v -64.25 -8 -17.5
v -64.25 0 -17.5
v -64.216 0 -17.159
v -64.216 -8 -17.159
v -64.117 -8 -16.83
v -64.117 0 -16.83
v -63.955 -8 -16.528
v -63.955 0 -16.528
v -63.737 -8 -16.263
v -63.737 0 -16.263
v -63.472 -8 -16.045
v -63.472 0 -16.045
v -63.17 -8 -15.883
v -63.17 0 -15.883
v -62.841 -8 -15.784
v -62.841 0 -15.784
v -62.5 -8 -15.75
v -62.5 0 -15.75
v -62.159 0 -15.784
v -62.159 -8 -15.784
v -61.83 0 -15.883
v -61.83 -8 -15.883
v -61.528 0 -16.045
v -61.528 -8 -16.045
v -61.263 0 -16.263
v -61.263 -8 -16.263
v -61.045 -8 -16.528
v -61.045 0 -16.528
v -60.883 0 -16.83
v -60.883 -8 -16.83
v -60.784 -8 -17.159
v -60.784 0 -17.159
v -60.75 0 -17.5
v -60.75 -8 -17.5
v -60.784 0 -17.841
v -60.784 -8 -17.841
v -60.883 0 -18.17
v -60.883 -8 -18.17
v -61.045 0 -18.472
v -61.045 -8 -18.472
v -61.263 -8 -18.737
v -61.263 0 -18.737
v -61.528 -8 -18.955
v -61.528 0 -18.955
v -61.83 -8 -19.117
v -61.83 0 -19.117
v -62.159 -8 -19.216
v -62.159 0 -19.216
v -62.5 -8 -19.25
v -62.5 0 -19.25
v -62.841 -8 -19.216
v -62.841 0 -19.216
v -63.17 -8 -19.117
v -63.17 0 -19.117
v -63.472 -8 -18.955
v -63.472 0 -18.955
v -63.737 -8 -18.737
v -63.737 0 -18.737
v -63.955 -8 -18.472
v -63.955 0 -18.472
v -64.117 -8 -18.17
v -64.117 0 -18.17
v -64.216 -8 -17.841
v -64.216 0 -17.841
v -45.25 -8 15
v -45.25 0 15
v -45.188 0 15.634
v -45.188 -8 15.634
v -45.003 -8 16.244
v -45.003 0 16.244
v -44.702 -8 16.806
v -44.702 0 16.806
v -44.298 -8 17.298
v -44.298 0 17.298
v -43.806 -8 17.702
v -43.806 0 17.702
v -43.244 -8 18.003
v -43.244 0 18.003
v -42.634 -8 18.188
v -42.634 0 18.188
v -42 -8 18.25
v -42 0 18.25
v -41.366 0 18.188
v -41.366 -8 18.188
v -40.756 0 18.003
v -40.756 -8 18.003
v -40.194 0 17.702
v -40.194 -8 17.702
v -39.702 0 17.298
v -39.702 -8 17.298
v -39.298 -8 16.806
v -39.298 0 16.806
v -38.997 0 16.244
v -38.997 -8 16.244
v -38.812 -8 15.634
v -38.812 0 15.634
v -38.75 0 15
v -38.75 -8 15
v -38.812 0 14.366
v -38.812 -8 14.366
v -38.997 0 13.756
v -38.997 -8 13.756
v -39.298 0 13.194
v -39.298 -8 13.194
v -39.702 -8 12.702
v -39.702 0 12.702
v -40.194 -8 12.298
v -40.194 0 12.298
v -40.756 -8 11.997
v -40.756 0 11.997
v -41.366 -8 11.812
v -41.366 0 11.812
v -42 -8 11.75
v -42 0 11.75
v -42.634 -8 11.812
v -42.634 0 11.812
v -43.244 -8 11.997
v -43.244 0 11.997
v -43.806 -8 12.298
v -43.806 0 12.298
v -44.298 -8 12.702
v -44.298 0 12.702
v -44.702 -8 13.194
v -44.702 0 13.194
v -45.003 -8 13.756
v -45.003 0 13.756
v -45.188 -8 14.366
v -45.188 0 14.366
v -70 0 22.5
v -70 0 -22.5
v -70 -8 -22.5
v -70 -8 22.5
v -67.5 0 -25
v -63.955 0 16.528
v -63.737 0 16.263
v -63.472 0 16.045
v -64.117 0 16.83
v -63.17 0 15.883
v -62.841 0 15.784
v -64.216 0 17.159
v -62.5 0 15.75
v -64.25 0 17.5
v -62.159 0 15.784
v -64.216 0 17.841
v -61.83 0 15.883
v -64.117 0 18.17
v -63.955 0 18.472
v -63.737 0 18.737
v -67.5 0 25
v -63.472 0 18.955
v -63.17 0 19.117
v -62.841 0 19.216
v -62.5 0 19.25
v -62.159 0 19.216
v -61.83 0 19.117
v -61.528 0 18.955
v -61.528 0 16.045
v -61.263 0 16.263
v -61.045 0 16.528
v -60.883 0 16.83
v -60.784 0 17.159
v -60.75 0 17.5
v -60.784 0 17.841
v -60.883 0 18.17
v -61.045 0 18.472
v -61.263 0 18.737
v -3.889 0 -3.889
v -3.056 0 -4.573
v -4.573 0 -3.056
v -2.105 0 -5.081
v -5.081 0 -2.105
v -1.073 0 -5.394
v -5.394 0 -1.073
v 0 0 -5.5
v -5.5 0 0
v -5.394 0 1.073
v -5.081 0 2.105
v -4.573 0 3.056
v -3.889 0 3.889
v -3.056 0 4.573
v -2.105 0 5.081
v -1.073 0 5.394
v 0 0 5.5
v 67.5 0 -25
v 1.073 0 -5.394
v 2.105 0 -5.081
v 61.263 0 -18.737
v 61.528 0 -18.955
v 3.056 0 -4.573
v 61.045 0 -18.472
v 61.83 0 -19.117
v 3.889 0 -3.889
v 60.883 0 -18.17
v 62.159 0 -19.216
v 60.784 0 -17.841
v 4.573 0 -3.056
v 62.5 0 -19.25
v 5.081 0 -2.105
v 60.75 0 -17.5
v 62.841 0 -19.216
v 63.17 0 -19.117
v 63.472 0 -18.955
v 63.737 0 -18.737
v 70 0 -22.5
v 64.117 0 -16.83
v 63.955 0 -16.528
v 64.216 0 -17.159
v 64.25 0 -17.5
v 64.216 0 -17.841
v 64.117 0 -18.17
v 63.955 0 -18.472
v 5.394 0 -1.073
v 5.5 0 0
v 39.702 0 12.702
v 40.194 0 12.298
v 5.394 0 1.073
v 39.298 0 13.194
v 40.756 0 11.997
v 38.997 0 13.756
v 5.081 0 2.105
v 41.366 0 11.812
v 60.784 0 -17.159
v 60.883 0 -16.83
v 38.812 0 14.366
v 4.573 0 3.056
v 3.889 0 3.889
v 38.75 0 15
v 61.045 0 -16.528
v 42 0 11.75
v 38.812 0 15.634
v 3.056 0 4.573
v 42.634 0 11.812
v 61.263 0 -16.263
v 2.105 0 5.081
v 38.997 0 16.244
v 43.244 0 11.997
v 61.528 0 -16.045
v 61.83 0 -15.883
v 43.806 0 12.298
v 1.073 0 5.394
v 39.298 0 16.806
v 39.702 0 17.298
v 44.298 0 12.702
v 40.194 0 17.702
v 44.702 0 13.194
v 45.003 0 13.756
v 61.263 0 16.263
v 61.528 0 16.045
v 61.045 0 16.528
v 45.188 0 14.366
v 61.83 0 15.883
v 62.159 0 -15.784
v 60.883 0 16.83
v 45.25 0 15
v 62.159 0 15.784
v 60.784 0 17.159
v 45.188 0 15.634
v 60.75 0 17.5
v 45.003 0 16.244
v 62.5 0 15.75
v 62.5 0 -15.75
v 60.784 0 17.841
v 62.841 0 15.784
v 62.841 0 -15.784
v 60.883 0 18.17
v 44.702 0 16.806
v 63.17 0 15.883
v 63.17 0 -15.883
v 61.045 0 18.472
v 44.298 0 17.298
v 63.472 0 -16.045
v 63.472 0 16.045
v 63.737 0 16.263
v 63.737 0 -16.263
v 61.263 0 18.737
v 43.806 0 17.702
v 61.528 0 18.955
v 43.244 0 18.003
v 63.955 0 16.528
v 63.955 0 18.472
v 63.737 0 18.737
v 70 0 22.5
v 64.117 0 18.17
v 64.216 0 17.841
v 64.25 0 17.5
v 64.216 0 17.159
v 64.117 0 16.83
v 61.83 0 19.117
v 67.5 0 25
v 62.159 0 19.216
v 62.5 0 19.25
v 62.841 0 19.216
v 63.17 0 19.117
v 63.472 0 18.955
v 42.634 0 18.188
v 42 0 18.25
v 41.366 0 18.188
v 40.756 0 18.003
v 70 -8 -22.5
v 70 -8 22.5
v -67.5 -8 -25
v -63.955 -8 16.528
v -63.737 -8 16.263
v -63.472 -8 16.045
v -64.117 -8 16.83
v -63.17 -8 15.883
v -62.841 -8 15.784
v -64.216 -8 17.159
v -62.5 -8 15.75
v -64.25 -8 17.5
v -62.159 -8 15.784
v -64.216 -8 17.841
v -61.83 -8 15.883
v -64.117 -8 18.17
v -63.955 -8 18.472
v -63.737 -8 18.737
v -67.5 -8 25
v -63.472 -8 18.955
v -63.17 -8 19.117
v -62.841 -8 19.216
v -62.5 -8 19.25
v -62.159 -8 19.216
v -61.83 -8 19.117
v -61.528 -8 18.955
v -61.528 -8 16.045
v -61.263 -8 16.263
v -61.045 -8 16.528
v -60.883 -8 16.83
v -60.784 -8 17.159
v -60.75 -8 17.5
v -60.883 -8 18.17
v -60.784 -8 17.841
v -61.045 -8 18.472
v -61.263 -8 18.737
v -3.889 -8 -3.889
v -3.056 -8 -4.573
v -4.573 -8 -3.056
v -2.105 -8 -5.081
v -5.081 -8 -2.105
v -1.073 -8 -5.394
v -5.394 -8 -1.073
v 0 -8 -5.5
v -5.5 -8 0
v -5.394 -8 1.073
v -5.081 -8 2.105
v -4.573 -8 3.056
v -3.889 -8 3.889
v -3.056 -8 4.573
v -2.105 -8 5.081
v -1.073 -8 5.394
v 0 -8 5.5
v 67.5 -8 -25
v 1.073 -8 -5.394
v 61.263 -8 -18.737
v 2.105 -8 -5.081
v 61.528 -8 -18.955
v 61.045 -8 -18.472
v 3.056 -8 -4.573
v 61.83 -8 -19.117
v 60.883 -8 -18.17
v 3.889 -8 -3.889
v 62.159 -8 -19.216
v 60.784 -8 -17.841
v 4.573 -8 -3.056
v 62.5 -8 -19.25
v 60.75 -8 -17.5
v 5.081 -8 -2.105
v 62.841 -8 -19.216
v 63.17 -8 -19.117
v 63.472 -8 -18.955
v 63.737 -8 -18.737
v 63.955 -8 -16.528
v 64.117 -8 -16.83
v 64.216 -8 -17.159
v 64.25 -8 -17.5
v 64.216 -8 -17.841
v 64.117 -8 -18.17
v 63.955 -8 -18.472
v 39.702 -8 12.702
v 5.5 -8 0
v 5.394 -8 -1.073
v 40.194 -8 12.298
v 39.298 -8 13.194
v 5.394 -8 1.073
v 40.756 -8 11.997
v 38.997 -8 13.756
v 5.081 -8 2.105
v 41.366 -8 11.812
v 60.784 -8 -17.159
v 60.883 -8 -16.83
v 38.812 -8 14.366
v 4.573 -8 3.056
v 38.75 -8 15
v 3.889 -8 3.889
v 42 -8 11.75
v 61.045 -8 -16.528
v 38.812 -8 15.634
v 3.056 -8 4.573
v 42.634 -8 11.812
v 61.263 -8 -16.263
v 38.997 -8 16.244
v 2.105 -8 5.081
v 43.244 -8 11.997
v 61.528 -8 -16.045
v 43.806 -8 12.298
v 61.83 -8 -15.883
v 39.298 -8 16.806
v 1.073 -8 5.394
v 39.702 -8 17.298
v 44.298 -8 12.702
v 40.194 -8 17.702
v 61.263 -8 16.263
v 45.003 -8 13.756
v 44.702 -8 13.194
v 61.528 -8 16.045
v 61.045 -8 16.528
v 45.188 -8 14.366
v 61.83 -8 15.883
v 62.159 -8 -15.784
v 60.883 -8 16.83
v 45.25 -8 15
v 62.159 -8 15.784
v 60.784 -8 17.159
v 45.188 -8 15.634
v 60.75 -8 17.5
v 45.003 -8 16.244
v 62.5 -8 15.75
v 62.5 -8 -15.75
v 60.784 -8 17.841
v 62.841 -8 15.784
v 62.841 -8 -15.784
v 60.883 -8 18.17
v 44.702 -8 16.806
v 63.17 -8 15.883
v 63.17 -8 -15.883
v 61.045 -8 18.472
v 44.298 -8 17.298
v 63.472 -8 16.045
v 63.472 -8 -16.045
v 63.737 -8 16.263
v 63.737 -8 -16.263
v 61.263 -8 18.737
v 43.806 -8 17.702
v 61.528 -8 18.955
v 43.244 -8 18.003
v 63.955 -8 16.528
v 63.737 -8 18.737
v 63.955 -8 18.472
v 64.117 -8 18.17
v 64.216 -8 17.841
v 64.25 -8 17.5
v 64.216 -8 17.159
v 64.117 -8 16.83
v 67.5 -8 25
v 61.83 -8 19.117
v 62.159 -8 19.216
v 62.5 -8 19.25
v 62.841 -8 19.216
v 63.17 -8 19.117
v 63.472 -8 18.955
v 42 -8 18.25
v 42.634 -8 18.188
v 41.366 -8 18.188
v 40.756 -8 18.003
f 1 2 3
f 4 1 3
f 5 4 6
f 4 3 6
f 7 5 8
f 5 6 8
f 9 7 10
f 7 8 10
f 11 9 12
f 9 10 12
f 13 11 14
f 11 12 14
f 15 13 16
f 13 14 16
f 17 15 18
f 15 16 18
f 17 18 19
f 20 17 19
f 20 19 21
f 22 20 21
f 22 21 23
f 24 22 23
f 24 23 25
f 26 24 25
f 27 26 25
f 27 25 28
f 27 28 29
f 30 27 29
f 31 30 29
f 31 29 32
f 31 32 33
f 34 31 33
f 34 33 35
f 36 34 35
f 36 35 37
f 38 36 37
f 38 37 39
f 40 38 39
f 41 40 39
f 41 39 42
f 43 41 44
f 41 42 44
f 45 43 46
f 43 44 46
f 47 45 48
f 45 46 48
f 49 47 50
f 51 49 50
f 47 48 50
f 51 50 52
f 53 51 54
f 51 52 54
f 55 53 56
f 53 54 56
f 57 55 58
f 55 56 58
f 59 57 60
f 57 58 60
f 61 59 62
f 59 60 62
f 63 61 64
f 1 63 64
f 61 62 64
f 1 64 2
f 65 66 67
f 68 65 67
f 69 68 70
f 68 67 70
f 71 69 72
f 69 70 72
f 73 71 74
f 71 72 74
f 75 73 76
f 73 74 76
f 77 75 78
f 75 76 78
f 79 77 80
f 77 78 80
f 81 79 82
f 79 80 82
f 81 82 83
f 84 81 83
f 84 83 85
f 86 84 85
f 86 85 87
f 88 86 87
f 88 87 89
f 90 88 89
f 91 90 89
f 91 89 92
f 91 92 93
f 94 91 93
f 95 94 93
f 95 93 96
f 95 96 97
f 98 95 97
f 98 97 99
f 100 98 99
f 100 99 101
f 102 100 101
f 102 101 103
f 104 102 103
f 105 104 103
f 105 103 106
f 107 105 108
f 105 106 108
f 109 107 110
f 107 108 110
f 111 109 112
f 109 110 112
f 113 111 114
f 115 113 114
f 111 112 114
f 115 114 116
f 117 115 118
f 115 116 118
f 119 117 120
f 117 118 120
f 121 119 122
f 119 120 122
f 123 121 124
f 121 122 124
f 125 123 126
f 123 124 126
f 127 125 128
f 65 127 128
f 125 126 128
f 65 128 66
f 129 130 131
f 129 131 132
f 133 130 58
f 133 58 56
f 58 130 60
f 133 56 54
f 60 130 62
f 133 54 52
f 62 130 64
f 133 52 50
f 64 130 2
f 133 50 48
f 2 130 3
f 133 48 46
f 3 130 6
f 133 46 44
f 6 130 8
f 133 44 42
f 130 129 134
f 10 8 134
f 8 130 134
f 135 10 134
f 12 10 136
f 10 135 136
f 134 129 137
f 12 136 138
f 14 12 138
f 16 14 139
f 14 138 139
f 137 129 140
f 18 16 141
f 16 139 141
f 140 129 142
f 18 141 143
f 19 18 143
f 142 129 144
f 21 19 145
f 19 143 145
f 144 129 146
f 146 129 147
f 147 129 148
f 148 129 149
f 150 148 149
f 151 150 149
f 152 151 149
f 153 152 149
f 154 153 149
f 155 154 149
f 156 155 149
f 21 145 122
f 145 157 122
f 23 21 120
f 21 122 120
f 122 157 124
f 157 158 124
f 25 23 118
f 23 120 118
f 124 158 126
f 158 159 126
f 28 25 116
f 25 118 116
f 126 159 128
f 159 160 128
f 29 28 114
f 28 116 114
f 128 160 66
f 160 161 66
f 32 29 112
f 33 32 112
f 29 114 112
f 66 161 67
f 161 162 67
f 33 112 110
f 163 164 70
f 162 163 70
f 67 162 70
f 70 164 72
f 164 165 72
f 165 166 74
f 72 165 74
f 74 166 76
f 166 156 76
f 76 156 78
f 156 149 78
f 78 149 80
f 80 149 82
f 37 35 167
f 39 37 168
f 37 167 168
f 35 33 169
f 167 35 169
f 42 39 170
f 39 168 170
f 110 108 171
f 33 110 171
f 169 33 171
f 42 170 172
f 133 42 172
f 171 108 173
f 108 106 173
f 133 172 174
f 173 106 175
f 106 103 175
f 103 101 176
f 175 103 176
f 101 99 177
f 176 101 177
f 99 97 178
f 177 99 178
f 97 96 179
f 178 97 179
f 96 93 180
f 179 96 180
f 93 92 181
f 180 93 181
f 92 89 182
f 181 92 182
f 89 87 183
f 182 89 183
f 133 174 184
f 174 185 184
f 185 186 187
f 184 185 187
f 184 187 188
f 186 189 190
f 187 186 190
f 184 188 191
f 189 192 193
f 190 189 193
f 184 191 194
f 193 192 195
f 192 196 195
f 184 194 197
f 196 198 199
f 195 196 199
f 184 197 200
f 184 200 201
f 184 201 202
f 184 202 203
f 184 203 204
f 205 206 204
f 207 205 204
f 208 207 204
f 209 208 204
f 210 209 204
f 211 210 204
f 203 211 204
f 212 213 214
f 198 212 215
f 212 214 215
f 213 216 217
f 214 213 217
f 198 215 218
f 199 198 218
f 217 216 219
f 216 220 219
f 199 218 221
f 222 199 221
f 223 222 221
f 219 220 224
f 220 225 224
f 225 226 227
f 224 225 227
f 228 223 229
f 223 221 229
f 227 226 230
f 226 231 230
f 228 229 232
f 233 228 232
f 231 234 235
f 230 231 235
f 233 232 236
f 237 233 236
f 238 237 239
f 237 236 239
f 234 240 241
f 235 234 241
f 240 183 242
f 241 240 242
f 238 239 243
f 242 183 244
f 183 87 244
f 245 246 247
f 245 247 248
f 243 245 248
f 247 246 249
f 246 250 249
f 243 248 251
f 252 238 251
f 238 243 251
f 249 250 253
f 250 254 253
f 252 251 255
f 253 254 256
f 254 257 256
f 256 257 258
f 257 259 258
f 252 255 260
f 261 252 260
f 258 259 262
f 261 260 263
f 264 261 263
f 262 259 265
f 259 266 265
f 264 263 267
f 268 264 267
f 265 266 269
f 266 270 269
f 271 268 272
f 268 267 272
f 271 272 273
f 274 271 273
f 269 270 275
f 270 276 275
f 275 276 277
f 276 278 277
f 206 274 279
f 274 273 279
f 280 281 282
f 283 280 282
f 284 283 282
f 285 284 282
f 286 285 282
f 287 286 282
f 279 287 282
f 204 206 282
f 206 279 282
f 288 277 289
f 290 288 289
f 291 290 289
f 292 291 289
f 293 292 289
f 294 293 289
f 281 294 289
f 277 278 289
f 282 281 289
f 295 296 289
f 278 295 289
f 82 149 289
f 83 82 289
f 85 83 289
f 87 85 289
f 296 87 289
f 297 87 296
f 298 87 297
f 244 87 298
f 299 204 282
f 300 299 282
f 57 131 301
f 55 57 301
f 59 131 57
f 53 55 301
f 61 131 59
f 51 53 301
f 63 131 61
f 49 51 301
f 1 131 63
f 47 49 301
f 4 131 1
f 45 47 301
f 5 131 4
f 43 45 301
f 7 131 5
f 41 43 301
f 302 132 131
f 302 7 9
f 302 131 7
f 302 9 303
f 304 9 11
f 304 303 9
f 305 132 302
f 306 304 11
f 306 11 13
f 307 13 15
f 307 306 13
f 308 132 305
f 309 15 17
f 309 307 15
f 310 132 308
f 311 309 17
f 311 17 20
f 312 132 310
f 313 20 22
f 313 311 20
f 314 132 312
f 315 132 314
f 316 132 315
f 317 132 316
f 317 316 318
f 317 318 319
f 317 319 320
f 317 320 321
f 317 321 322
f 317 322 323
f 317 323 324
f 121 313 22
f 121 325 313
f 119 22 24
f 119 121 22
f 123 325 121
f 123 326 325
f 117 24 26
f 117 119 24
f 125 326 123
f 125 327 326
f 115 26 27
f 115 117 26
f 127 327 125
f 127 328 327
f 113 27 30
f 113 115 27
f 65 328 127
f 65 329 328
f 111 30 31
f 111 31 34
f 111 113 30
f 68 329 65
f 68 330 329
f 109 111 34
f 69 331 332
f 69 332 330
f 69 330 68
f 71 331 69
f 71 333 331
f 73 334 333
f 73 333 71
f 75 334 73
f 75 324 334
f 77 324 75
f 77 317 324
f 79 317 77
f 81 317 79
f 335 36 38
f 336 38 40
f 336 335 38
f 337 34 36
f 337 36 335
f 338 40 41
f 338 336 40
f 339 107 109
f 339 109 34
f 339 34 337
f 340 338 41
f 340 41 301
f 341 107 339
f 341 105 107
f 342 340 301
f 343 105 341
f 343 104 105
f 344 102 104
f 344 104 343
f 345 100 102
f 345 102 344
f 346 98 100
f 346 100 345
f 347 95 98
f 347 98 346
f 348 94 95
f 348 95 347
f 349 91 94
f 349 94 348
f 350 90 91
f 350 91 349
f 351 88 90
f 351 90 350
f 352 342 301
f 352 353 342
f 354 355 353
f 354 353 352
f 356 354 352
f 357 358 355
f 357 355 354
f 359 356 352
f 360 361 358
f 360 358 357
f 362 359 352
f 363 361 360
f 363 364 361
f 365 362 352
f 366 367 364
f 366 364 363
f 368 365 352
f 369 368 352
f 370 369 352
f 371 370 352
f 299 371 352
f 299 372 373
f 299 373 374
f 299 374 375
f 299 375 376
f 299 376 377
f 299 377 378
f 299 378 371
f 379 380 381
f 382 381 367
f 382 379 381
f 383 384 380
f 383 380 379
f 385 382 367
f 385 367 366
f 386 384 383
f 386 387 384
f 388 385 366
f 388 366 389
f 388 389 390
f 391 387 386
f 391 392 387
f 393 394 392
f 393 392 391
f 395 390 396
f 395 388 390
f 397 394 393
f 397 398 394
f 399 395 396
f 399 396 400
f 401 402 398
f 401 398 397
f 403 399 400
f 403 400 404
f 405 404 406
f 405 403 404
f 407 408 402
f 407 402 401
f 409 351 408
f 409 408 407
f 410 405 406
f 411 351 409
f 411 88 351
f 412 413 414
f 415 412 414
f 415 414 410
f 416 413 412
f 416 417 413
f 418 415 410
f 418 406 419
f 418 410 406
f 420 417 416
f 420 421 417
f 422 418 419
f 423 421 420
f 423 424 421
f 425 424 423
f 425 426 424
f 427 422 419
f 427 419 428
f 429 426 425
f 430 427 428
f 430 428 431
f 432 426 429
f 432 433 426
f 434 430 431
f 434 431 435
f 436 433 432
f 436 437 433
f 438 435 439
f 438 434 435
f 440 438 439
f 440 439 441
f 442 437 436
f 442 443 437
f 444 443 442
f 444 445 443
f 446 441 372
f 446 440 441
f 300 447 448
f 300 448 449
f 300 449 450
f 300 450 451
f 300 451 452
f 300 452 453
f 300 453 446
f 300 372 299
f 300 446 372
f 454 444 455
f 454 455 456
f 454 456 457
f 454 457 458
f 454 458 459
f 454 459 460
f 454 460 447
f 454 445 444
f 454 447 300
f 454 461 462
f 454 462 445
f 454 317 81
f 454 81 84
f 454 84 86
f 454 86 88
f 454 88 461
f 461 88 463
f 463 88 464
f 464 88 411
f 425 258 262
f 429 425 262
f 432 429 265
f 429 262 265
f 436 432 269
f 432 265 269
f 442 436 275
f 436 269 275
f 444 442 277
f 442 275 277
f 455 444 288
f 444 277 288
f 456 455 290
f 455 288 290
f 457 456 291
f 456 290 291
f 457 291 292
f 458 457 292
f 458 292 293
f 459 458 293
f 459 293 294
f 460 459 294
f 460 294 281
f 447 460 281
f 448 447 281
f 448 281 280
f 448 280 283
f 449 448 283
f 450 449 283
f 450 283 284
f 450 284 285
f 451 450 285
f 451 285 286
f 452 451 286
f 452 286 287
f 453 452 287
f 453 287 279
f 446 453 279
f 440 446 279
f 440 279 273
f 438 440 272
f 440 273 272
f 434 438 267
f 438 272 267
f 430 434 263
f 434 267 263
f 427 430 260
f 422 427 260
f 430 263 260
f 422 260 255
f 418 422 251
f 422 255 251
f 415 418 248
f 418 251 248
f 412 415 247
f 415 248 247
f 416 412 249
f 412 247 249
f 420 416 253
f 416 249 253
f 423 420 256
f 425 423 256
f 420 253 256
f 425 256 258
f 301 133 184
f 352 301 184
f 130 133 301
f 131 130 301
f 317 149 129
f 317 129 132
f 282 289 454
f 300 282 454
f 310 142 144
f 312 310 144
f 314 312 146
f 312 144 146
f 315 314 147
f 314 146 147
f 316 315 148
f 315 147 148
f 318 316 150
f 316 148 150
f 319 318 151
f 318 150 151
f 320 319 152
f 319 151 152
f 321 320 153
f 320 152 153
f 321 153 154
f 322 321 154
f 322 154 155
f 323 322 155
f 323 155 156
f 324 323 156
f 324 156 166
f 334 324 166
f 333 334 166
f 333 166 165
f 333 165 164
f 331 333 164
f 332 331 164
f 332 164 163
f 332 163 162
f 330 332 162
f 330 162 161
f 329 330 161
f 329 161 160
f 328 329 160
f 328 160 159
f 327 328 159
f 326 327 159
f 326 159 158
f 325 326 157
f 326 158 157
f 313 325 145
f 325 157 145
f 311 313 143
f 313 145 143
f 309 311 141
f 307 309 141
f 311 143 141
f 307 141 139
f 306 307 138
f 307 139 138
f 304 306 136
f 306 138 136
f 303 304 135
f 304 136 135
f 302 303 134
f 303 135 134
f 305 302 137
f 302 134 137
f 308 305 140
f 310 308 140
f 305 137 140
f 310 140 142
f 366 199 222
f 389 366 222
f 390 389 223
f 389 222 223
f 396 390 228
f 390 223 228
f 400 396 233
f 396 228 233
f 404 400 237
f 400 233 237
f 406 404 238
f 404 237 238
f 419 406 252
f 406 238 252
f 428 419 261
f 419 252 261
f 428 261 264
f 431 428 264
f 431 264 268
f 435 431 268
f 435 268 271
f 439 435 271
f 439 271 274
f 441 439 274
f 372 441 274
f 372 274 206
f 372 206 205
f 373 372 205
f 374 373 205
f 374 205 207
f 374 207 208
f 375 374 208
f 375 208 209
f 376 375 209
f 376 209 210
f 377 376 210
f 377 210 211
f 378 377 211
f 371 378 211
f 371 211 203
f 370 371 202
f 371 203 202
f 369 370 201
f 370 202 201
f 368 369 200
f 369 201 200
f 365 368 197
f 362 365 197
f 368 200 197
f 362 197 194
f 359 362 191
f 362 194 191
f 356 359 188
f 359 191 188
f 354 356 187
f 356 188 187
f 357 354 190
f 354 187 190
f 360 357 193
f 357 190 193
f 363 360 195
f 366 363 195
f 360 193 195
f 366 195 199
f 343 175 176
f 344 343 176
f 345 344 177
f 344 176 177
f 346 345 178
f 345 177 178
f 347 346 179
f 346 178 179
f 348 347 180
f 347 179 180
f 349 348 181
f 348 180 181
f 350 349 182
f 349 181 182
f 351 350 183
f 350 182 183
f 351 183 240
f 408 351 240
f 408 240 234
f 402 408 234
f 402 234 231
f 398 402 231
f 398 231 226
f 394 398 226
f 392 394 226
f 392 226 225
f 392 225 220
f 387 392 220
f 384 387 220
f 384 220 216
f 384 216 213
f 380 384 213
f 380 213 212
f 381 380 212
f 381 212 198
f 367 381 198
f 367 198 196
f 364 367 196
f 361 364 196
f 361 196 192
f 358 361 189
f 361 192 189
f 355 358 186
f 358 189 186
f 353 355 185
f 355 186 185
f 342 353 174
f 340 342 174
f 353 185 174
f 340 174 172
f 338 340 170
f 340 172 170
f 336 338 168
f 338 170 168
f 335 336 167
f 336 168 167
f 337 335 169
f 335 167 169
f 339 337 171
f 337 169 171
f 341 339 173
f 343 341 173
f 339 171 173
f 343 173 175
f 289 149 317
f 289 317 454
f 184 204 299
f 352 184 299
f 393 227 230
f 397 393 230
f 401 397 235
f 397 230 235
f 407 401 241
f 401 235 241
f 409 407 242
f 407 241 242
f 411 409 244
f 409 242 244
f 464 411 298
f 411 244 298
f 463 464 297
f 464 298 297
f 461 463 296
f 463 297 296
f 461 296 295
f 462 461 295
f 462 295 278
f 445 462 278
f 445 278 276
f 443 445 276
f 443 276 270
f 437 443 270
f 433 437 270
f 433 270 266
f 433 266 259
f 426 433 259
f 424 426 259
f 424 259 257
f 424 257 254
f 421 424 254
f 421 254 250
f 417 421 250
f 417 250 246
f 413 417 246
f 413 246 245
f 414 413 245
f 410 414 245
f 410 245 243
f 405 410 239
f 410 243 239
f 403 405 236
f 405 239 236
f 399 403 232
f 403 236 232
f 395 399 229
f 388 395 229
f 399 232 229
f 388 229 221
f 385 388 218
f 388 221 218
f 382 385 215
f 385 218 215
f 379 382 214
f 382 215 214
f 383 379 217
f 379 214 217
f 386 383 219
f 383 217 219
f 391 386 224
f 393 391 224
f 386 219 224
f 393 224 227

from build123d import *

# Parameters (mm, degrees)
F0_W     = 140
F0_H     = 50
F1_DEPTH = 8
F2_SIZE  = 2.5
F4_D     = 3.5
F5_D     = 6.5
F6_D     = 11


with BuildPart() as f1:
    # F0 (on Front) → F1 (new body)
    with BuildSketch(Plane.XZ):
        Rectangle(F0_W, F0_H)
    extrude(amount=F1_DEPTH)

    # F2
    f2_edges = [f1.edges().sort_by_distance(p)[0] for p in [
        (70, -4, 25),
        (-70, -4, 25),
        (70, -4, -25),
        (-70, -4, -25),
    ]]
    chamfer(f2_edges, length=F2_SIZE)

    # F4 (through all)
    with Locations(Plane.XZ.offset(8)):
        with Locations((62.5, 17.5), (62.5, -17.5), (-62.5, -17.5), (-62.5, 17.5)):
            Hole(F4_D / 2)

    # F5 (through all)
    with Locations(Plane.XZ.offset(8)):
        with Locations((42, 15), (-42, 15)):
            Hole(F5_D / 2)

    # F6 (through all)
    with Locations(Plane.XZ.offset(8)):
        with Locations((0, 0)):
            Hole(F6_D / 2)


solid = f1.part
